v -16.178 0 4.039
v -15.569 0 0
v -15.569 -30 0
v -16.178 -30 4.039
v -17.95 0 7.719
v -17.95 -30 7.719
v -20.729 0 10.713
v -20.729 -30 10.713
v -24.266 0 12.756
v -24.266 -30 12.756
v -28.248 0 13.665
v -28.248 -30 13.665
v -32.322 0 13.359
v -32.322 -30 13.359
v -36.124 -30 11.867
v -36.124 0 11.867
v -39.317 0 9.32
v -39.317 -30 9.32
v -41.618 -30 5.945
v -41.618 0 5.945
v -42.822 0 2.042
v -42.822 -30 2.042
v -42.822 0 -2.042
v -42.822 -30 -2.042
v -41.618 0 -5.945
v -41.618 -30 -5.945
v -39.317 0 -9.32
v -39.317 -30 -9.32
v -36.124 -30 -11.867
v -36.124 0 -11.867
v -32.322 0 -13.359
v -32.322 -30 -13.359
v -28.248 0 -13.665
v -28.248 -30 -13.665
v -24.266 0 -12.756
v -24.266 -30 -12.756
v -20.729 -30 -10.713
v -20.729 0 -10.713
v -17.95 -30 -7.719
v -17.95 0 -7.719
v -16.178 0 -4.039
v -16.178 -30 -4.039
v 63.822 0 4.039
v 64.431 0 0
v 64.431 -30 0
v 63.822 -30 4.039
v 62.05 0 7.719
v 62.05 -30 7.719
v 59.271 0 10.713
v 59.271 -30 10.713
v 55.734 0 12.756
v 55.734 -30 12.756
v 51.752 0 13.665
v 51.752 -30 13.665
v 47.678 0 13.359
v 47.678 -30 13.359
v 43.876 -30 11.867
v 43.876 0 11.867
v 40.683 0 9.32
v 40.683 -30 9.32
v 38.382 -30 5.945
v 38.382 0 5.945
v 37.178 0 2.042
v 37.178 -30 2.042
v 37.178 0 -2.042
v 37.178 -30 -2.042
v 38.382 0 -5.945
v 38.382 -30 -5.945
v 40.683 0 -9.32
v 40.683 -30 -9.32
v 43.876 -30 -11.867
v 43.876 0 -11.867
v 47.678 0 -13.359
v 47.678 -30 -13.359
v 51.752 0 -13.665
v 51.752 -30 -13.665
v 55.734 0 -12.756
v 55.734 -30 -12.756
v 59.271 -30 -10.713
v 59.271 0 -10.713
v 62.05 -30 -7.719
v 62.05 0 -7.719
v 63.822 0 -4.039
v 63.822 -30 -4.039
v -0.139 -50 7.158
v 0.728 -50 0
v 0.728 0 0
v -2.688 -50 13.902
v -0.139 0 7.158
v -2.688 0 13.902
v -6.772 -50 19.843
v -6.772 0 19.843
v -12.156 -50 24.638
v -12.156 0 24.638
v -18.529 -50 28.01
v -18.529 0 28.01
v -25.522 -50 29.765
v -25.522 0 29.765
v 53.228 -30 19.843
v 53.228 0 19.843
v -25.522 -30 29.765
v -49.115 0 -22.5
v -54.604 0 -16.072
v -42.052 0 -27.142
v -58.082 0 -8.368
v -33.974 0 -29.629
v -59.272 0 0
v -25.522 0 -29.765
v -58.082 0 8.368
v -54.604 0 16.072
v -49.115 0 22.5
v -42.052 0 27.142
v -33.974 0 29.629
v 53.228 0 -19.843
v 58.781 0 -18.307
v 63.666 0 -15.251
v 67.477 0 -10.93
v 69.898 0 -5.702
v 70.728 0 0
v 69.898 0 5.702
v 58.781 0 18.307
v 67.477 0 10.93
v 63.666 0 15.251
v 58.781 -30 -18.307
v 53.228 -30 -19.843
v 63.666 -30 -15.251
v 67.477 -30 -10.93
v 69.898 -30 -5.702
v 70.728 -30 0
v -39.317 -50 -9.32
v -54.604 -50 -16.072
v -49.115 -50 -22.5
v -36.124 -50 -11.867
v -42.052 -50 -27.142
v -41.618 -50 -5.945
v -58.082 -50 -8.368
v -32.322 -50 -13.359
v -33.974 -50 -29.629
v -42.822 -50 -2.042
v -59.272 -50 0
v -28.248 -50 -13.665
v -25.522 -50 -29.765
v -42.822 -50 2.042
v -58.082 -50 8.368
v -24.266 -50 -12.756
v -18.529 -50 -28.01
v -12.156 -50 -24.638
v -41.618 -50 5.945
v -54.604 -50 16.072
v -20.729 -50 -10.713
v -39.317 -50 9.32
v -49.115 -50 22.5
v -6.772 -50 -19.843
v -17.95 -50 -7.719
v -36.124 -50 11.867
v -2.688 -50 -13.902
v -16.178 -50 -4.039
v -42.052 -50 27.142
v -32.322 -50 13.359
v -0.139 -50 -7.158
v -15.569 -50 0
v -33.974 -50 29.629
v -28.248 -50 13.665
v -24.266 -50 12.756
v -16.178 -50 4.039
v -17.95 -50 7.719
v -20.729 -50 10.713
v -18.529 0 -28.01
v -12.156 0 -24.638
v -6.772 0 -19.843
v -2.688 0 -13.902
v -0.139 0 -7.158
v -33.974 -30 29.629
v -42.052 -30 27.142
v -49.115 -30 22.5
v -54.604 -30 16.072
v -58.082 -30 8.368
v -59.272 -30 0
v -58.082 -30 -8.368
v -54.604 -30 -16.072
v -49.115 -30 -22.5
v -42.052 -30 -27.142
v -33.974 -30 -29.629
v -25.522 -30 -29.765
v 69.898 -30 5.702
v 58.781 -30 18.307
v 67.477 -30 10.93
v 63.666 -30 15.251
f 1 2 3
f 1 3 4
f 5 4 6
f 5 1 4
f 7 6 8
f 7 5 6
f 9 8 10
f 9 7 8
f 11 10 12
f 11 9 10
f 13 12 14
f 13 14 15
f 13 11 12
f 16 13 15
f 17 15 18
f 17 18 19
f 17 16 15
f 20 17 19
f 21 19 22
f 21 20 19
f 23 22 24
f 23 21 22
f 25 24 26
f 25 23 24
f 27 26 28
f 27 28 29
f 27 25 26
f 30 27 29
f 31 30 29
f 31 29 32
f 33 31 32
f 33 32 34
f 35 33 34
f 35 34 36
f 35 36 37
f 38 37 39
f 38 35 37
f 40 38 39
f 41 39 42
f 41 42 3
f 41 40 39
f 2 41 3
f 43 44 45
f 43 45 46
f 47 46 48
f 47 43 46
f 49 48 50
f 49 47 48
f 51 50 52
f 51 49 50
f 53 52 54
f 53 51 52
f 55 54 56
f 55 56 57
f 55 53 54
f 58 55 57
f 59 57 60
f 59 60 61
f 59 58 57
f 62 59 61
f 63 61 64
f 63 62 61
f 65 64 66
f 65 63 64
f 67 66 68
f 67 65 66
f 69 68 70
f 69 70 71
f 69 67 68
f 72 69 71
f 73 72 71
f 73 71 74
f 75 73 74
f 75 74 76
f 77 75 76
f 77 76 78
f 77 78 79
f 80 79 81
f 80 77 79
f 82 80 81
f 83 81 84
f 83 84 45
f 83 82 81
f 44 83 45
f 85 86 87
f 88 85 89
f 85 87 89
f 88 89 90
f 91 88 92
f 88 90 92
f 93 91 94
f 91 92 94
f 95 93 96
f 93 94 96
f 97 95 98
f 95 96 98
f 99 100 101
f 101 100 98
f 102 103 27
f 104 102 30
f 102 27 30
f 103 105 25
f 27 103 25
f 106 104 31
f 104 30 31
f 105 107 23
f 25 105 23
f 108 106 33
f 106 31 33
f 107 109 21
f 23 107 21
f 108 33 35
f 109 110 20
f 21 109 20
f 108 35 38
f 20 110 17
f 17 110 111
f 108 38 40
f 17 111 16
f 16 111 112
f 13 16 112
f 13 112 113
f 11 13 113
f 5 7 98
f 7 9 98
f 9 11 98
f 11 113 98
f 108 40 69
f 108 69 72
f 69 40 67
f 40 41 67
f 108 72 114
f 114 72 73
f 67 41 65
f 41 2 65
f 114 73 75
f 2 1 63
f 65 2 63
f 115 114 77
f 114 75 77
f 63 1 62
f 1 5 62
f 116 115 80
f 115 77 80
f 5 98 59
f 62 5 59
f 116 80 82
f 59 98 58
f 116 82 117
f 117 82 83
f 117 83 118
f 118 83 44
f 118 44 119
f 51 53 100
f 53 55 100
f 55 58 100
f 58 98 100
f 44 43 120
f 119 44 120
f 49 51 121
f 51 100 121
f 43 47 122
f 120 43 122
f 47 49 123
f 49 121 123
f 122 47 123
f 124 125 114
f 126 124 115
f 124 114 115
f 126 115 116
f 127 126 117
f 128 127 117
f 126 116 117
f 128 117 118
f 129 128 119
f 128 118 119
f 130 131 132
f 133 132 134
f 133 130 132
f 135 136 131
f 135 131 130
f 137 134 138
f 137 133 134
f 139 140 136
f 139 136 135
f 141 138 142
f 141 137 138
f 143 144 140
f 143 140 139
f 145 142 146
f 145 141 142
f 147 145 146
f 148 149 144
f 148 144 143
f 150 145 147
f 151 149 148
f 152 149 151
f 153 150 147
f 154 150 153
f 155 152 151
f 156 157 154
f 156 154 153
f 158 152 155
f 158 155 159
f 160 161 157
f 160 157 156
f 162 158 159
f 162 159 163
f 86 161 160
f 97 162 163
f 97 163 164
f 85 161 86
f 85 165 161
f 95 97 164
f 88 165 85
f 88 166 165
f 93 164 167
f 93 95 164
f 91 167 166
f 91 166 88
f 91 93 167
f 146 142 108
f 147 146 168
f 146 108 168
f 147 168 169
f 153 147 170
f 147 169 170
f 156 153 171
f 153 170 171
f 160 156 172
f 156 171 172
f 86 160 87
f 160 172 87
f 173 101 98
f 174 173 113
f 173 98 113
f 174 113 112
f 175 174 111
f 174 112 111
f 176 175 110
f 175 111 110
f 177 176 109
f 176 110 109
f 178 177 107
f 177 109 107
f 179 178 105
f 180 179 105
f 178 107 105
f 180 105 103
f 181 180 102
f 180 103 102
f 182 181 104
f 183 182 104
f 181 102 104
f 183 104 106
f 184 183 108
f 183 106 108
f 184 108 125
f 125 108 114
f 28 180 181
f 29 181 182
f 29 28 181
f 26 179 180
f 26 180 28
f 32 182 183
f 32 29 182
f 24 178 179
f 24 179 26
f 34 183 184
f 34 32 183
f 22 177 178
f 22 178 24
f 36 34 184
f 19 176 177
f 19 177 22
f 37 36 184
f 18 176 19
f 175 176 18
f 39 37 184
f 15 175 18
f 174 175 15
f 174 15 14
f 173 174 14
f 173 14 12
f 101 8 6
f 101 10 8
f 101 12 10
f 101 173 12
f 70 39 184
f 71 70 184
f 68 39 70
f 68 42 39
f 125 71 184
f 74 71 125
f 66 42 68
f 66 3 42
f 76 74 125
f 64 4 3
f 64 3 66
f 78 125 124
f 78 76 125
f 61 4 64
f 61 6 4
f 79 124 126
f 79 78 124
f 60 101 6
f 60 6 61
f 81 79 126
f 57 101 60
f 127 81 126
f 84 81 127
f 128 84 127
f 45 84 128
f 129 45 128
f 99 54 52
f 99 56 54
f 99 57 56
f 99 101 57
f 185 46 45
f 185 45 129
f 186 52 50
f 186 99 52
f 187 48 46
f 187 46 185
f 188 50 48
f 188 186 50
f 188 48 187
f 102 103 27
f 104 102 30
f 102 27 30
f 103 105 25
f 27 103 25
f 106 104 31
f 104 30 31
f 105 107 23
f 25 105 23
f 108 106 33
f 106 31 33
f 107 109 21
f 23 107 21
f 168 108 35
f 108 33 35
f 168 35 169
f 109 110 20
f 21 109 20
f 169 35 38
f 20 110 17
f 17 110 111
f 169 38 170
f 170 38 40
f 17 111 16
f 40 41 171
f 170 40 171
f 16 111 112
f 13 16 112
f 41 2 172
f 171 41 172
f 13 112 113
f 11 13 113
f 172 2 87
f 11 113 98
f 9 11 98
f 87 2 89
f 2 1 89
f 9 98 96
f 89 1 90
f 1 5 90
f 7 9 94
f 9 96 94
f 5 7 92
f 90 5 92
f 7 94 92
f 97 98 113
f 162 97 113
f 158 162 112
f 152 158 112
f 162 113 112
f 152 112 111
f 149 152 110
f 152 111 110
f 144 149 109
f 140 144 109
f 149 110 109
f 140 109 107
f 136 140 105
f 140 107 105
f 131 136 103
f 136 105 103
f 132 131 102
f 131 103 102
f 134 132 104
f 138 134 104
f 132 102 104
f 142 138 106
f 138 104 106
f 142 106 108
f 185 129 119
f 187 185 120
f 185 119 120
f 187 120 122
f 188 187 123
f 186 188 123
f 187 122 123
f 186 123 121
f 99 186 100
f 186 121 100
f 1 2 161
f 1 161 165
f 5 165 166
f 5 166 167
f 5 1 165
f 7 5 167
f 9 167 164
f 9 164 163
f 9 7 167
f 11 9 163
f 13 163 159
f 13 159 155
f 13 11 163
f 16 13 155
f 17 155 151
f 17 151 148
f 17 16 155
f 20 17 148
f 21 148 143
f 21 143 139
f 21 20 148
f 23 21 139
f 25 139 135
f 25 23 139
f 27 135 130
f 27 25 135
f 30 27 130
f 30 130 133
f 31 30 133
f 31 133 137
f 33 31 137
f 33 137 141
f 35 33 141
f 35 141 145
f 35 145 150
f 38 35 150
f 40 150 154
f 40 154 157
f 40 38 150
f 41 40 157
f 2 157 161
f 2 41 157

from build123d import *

# Parameters (mm, degrees)
F0_R     = 13.702917
F1_DEPTH = 30
F2_DEPTH = 50


with BuildPart() as f1:
    # F0 (on Front) → F1 (new body)
    with BuildSketch(Plane.XZ):
        with BuildLine():
            ThreePointArc((-25.52233, -29.764702), (-6.77233, -19.843135), (0.72767, 0))
            ThreePointArc((0.72767, 0), (-6.77233, 19.843135), (-25.52233, 29.764702))
            ThreePointArc((-25.52233, 29.764702), (-59.27233, 0), (-25.52233, -29.764702))
        make_face()
        with Locations((-29.27233, 0)):
            Circle(F0_R, mode=Mode.SUBTRACT)
        with BuildLine():
            ThreePointArc((70.72767, 0), (65.72767, 13.228757), (53.22767, 19.843135))
            ThreePointArc((53.22767, 19.843135), (30.72767, 0), (53.22767, -19.843135))
            ThreePointArc((53.22767, -19.843135), (65.72767, -13.228757), (70.72767, 0))
        make_face()
        with Locations((50.72767, 0)):
            Circle(F0_R, mode=Mode.SUBTRACT)
        with BuildLine():
            ThreePointArc((-25.52233, 29.764702), (-6.77233, 19.843135), (0.72767, 0))
            ThreePointArc((0.72767, 0), (-6.77233, -19.843135), (-25.52233, -29.764702))
            Line((-25.52233, -29.764702), (53.22767, -19.843135))
            ThreePointArc((53.22767, -19.843135), (30.72767, 0), (53.22767, 19.843135))
            Line((53.22767, 19.843135), (-25.52233, 29.764702))
        make_face()
    extrude(amount=F1_DEPTH)


with BuildPart() as f2:
    # F0 (on Front) → F2 (new body)
    with BuildSketch(Plane.XZ):
        with BuildLine():
            ThreePointArc((-25.52233, -29.764702), (-6.77233, -19.843135), (0.72767, 0))
            ThreePointArc((0.72767, 0), (-6.77233, 19.843135), (-25.52233, 29.764702))
            ThreePointArc((-25.52233, 29.764702), (-59.27233, 0), (-25.52233, -29.764702))
        make_face()
        with Locations((-29.27233, 0)):
            Circle(F0_R, mode=Mode.SUBTRACT)
    extrude(amount=F2_DEPTH)


solid = Compound([f1.part, f2.part])
